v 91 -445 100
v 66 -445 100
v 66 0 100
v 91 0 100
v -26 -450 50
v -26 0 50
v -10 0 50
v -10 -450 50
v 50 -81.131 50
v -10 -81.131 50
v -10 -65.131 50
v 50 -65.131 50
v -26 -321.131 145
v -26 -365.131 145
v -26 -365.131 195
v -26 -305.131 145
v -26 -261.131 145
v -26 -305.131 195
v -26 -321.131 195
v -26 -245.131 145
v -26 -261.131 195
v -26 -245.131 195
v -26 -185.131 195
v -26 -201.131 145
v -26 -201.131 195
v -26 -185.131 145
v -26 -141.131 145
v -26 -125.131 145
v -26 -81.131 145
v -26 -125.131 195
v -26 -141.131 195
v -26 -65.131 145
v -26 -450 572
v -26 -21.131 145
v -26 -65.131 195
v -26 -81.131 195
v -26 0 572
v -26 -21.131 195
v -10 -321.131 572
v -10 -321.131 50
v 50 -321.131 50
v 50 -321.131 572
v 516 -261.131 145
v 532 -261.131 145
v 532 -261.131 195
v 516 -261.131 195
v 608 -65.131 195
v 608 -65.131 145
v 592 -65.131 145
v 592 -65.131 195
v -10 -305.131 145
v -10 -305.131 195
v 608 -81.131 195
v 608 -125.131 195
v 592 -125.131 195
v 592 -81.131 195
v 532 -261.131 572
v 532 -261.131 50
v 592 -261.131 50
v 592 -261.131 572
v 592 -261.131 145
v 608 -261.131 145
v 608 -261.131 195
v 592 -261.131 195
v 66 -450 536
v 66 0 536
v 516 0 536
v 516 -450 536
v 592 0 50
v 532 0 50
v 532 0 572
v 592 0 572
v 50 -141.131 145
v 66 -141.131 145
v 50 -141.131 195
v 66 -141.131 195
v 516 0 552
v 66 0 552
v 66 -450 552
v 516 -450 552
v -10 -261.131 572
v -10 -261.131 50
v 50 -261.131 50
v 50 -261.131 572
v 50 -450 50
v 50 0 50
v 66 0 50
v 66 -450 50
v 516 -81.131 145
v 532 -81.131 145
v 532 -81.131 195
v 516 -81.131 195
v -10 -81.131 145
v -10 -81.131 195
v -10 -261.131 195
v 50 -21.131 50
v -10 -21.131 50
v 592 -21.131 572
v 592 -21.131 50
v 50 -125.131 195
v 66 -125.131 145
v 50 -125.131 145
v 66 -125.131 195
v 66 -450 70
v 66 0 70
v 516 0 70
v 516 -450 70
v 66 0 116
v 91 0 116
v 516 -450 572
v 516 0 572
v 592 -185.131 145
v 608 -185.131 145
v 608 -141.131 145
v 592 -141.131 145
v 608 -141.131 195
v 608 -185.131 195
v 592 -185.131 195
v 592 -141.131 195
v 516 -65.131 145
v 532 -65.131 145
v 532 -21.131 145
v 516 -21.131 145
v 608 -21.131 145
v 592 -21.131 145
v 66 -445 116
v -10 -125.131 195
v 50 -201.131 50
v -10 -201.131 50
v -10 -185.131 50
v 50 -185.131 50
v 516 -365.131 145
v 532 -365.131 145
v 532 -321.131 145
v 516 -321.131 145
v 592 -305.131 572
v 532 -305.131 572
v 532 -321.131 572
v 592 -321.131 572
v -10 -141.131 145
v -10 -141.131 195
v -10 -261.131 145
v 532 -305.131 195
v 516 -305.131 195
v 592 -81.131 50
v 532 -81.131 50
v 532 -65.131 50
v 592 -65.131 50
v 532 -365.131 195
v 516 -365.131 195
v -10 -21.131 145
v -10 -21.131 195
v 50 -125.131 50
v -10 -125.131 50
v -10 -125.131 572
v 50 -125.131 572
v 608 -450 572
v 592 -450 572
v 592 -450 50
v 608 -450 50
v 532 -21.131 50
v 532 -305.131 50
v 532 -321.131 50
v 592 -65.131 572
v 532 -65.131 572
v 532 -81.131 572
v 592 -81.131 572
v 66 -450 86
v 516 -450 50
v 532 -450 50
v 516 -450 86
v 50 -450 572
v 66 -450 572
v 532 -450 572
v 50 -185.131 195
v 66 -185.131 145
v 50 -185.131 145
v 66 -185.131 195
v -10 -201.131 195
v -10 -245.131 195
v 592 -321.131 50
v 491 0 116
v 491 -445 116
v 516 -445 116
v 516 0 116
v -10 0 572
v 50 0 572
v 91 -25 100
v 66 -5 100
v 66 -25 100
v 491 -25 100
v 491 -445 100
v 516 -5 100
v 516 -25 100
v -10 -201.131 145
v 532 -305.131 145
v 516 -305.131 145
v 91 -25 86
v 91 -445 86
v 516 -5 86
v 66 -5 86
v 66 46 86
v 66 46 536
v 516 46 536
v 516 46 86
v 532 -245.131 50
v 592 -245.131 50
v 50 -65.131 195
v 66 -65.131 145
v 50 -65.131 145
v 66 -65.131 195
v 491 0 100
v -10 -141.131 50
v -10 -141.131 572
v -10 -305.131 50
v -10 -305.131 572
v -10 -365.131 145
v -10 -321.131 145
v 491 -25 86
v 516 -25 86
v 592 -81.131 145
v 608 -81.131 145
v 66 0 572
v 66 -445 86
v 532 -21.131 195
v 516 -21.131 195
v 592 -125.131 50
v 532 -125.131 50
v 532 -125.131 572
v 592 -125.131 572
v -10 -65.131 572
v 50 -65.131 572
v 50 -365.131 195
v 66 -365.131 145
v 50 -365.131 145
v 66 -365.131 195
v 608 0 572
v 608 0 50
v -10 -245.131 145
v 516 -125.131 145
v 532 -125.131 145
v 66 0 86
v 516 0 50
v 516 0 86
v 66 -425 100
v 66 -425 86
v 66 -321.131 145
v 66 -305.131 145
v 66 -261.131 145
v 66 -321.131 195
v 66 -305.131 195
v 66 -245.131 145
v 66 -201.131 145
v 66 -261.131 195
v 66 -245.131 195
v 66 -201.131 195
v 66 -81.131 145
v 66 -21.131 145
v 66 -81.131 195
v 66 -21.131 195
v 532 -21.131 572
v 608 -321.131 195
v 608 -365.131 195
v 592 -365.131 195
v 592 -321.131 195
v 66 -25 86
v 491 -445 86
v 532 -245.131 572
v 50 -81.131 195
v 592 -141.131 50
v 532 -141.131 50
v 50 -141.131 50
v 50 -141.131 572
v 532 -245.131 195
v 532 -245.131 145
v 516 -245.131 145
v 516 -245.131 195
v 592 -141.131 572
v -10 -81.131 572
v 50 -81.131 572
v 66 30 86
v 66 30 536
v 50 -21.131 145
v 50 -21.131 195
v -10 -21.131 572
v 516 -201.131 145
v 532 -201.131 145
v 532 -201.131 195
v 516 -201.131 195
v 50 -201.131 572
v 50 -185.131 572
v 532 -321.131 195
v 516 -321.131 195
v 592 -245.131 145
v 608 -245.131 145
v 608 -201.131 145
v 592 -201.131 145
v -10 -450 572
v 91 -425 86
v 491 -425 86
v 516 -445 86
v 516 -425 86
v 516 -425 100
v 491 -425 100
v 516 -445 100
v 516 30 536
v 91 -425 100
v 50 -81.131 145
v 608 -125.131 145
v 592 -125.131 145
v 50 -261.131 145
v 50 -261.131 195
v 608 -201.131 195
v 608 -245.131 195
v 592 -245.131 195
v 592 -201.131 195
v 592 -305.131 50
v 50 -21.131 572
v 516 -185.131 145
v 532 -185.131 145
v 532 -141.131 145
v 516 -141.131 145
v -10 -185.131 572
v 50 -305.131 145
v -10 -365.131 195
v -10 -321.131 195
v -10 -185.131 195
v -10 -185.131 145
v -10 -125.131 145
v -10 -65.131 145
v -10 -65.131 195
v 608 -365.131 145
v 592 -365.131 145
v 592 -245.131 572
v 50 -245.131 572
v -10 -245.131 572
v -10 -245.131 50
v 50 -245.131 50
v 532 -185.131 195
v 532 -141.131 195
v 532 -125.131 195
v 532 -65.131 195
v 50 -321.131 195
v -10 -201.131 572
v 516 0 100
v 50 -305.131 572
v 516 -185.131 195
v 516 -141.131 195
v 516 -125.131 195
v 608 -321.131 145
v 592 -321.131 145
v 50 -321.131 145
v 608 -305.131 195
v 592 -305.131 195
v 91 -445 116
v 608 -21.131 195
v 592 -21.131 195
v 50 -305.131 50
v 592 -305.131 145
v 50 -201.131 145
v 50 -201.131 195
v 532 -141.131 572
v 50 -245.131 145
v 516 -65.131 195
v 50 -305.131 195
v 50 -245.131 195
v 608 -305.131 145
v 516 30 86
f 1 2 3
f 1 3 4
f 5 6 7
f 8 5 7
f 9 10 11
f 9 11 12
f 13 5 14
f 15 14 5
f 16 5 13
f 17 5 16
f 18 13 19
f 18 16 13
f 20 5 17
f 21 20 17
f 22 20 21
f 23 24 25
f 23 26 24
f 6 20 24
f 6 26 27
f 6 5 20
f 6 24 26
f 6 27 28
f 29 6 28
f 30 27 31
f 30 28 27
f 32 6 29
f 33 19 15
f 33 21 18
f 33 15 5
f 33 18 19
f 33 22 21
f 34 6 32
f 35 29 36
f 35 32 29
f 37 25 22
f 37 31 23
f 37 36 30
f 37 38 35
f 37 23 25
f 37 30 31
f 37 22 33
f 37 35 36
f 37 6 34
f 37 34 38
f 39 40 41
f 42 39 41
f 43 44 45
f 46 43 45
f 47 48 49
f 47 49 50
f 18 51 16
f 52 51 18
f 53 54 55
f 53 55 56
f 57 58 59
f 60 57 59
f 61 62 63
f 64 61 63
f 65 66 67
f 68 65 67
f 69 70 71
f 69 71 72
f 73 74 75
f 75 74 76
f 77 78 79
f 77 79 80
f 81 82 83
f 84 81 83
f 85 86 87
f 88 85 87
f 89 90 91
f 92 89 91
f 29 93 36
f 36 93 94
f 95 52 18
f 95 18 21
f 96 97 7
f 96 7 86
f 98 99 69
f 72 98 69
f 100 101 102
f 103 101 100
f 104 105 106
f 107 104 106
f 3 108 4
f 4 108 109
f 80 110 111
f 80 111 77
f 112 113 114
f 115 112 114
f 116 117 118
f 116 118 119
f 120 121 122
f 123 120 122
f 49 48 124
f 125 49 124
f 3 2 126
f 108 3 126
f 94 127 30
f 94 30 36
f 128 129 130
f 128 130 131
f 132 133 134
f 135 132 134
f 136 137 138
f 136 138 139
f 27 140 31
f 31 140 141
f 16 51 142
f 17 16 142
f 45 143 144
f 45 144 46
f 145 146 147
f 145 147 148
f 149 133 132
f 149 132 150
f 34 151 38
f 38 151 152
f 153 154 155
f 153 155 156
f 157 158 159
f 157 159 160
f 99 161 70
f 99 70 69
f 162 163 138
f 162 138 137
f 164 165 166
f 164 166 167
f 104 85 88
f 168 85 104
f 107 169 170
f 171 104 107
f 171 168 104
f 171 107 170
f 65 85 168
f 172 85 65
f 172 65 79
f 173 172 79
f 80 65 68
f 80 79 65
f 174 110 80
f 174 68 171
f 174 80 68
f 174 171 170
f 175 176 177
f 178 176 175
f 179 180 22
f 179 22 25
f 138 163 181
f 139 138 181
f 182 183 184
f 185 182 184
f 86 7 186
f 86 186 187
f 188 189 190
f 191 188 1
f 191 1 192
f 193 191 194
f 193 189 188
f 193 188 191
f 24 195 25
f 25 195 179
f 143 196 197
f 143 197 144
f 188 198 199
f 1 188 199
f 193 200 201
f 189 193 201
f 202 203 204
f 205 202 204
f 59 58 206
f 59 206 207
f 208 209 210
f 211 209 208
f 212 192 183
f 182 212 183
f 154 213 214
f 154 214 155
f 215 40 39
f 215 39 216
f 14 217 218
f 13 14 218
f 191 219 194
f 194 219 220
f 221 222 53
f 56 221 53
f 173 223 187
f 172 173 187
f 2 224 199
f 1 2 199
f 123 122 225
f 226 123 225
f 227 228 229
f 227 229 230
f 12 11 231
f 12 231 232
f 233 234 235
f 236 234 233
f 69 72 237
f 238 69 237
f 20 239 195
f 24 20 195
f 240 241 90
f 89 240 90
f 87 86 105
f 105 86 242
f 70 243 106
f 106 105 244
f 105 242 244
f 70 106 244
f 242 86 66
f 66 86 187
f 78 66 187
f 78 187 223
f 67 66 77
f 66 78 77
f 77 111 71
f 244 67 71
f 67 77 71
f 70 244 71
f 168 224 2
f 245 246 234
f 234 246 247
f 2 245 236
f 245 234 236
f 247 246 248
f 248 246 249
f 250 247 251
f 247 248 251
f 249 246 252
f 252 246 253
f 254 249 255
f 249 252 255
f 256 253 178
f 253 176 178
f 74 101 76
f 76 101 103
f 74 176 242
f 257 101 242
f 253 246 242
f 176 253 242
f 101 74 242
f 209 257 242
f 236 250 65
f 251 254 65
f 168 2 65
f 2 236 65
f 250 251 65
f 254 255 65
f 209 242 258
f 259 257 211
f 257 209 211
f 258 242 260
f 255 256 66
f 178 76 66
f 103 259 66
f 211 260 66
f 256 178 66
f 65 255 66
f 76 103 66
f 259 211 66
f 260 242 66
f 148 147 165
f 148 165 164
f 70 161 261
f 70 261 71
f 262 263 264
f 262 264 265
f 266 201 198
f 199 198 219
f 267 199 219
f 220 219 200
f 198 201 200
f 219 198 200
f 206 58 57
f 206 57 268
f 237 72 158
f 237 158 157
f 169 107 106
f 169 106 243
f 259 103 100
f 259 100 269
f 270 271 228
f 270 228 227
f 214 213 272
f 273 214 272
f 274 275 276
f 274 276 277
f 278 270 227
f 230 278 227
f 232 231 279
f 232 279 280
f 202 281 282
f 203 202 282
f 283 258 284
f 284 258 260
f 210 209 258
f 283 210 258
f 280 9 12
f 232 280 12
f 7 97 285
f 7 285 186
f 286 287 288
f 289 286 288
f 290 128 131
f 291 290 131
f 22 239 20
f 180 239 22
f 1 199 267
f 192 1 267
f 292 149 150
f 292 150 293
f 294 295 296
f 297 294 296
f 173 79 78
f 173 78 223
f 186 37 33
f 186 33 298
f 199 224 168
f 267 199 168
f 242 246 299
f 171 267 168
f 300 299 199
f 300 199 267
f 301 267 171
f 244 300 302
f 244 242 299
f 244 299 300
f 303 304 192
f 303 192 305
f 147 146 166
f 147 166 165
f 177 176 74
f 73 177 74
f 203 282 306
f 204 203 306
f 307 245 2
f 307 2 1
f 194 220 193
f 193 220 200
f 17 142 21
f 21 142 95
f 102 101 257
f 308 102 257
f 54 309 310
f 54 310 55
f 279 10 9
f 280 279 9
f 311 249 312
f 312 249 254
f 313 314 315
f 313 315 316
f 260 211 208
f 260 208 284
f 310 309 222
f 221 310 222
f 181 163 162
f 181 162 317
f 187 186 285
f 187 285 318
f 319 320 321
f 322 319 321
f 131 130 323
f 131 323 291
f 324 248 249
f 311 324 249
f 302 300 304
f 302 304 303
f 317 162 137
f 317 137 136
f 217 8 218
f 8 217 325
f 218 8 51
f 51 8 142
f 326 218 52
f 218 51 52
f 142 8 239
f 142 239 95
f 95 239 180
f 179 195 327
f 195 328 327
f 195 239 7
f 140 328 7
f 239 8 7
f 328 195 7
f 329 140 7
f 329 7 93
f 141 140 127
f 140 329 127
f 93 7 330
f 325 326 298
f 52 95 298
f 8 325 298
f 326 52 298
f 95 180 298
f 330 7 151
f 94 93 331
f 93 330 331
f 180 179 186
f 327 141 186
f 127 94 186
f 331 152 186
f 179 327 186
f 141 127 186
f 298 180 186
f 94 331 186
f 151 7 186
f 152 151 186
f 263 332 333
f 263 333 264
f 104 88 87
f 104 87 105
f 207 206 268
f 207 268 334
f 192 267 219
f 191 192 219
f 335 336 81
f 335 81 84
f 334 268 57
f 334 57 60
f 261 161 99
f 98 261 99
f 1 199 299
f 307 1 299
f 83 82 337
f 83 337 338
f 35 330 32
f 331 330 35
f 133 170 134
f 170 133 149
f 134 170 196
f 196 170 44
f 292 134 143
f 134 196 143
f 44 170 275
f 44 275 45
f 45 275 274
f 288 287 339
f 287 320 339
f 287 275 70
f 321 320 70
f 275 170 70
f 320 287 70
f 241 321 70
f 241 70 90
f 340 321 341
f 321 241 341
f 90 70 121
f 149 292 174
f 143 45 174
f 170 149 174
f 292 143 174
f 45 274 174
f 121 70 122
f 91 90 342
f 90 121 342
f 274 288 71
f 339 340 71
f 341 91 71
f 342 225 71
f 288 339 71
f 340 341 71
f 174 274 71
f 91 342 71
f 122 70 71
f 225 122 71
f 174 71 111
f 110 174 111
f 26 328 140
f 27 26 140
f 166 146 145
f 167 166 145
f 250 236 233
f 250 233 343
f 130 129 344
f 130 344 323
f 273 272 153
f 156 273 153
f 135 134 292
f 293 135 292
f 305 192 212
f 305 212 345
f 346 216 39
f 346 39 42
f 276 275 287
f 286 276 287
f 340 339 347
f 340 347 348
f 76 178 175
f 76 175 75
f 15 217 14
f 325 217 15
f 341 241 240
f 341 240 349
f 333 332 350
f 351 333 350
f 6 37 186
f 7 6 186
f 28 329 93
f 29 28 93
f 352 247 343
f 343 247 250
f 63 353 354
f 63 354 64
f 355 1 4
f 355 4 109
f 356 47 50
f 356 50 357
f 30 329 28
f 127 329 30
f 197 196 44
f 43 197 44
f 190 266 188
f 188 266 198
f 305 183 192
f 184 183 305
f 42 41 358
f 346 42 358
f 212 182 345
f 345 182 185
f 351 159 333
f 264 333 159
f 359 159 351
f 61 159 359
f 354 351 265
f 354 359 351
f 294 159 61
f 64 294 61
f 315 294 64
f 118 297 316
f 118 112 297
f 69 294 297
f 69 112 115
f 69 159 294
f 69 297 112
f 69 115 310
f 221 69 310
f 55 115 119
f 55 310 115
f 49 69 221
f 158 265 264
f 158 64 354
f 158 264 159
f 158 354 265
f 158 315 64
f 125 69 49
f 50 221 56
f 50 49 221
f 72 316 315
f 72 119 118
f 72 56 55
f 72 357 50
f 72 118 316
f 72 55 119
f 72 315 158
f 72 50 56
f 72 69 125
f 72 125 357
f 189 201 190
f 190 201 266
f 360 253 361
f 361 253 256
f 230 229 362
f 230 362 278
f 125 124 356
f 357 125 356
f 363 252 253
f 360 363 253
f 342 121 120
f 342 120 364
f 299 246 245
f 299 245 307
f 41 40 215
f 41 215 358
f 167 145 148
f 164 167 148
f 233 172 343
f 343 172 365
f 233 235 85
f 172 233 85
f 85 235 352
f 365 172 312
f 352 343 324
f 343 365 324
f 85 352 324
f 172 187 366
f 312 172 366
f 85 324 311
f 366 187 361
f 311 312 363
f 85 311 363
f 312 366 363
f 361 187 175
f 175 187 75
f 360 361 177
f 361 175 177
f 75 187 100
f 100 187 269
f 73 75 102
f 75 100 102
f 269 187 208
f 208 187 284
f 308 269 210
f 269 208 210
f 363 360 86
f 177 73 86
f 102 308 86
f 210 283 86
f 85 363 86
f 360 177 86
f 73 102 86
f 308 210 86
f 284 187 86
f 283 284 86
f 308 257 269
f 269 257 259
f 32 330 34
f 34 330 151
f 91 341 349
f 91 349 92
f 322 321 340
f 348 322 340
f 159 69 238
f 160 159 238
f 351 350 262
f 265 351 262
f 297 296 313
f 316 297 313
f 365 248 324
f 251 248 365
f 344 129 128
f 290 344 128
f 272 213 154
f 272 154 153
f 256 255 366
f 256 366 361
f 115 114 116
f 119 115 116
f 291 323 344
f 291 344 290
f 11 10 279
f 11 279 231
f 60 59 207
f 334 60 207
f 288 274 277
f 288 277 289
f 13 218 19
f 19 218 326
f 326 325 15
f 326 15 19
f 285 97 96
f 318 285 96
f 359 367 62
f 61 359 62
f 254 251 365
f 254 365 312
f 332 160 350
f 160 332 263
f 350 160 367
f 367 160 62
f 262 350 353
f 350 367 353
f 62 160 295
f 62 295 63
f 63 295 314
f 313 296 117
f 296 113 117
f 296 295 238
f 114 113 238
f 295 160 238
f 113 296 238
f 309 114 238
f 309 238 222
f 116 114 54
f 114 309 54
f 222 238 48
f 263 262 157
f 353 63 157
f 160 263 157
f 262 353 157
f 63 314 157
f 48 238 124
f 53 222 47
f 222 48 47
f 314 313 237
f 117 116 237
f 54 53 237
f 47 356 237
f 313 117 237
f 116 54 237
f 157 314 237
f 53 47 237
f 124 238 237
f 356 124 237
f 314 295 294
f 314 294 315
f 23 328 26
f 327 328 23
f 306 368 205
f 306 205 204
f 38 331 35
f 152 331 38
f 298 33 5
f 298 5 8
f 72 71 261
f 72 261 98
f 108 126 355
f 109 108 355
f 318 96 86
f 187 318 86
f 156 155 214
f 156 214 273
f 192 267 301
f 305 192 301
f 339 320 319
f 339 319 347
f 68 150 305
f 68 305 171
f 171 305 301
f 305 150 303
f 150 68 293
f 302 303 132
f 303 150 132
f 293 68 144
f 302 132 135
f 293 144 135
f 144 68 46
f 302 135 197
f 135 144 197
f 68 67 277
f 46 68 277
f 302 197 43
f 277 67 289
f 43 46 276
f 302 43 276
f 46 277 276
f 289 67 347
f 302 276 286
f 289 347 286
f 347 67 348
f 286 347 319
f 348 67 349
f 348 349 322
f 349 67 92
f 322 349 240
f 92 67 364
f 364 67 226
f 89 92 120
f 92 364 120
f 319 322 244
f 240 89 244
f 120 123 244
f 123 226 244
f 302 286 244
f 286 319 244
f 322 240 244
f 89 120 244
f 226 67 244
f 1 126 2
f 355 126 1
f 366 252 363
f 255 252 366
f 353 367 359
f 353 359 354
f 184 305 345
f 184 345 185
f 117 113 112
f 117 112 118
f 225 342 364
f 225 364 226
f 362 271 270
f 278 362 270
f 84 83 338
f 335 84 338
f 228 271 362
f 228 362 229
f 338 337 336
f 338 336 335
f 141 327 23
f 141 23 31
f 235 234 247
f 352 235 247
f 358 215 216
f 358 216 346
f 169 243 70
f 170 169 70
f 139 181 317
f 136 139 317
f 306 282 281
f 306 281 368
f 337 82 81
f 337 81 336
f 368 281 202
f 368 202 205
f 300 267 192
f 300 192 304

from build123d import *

# Parameters (mm, degrees)
F1_W          = 450
F1_H          = 16
F3_DEPTH      = 450
F1_W_2        = 16
F1_H_2        = 522
F4_W          = 44
F4_H          = 50
F5_DEPTH      = 1209
F5_DEPTH_BACK = 175
F6_W          = 60
F6_H          = 21.131195128
F7_DEPTH      = 572
F6_H_2        = 16
F7_FACE_W     = 60
F7_FACE_H     = 21.131195128
F7_FACE_H_2   = 16
F8_DEPTH      = 50
F9_START      = -30
F1_H_3        = 450
F9_DEPTH      = 16
F11_START     = 86
F11_DEPTH     = 14
F12_START     = 70
F10_W         = 25
F10_H         = 20
F12_DEPTH     = 30
F13_W         = 25
F13_H         = 16
F14_DEPTH     = 445


with BuildPart() as f3:
    # F1 (on Front) → F3 (new body, through all)
    with BuildSketch(Plane.XZ):
        with Locations((291, 78)):
            Rectangle(F1_W, F1_H)
        Polygon((516, 86), (516, 70), (516, 50), (532, 50), (532, 572), (516, 572), (516, 552), (516, 536), align=None)
        with Locations((291, 544)):
            Rectangle(F1_W, F1_H)
        Polygon((50, 572), (50, 50), (66, 50), (66, 70), (66, 86), (66, 536), (66, 552), (66, 572), align=None)
    extrude(amount=F3_DEPTH)


with BuildPart() as f3b:
    # F1 (on Front) → F3, piece 2 (new body, through all)
    with BuildSketch(Plane.XZ):
        with Locations((600, 311)):
            Rectangle(F1_W_2, F1_H_2)
    extrude(amount=F3_DEPTH)


with BuildPart() as f3c:
    # F1 (on Front) → F3, piece 3 (new body, through all)
    with BuildSketch(Plane.XZ):
        with Locations((-18, 311)):
            Rectangle(F1_W_2, F1_H_2)
    extrude(amount=F3_DEPTH)


with BuildPart() as f5_tool:
    # F4 (on Right) → F5 (new body, two sides)
    with BuildSketch(Plane.YZ) as f5_sk:
        with Locations((-43.131195128, 170)):
            Rectangle(F4_W, F4_H)
        with Locations((-103.131195128, 170)):
            Rectangle(F4_W, F4_H)
        with Locations((-163.131195128, 170)):
            Rectangle(F4_W, F4_H)
        with Locations((-223.131195128, 170)):
            Rectangle(F4_W, F4_H)
        with Locations((-283.131195128, 170)):
            Rectangle(F4_W, F4_H)
        with Locations((-343.131195128, 170)):
            Rectangle(F4_W, F4_H)
    extrude(amount=F5_DEPTH)
    extrude(f5_sk.sketch, amount=-F5_DEPTH_BACK)


with BuildPart() as f3_1:
    add(f3.part)

    # F5: cut by f5_tool
    add(f5_tool.part, mode=Mode.SUBTRACT)

    # F10 (on Top) → F12 (join)
    with BuildSketch(Plane.XY.offset(F12_START)):
        with Locations((78.5, -435)):
            Rectangle(F10_W, F10_H)
        with Locations((503.5, -435)):
            Rectangle(F10_W, F10_H)
    extrude(amount=F12_DEPTH)


with BuildPart() as f3b_1:
    add(f3b.part)

    # F5: cut by f5_tool
    add(f5_tool.part, mode=Mode.SUBTRACT)


with BuildPart() as f3c_1:
    add(f3c.part)

    # F5: cut by f5_tool
    add(f5_tool.part, mode=Mode.SUBTRACT)


with BuildPart() as f7:
    # F6 (on Top) → F7 (new body, through all)
    with BuildSketch(Plane.XY):
        with Locations((20, -10.565597564)):
            Rectangle(F6_W, F6_H)
    extrude(amount=F7_DEPTH)


with BuildPart() as f7b:
    # F6 (on Top) → F7, piece 2 (new body, through all)
    with BuildSketch(Plane.XY):
        with Locations((20, -73.131195128)):
            Rectangle(F6_W, F6_H_2)
    extrude(amount=F7_DEPTH)


with BuildPart() as f7c:
    # F6 (on Top) → F7, piece 3 (new body, through all)
    with BuildSketch(Plane.XY):
        with Locations((20, -133.131195128)):
            Rectangle(F6_W, F6_H_2)
    extrude(amount=F7_DEPTH)


with BuildPart() as f7d:
    # F6 (on Top) → F7, piece 4 (new body, through all)
    with BuildSketch(Plane.XY):
        with Locations((20, -193.131195128)):
            Rectangle(F6_W, F6_H_2)
    extrude(amount=F7_DEPTH)


with BuildPart() as f7e:
    # F6 (on Top) → F7, piece 5 (new body, through all)
    with BuildSketch(Plane.XY):
        with Locations((20, -253.131195128)):
            Rectangle(F6_W, F6_H_2)
    extrude(amount=F7_DEPTH)


with BuildPart() as f7f:
    # F6 (on Top) → F7, piece 6 (new body, through all)
    with BuildSketch(Plane.XY):
        with Locations((20, -313.131195128)):
            Rectangle(F6_W, F6_H_2)
    extrude(amount=F7_DEPTH)


with BuildPart() as f7g:
    # F6 (on Top) → F7, piece 7 (new body, through all)
    with BuildSketch(Plane.XY):
        with Locations((562, -313.131195128)):
            Rectangle(F6_W, F6_H_2)
    extrude(amount=F7_DEPTH)


with BuildPart() as f7h:
    # F6 (on Top) → F7, piece 8 (new body, through all)
    with BuildSketch(Plane.XY):
        with Locations((562, -253.131195128)):
            Rectangle(F6_W, F6_H_2)
    extrude(amount=F7_DEPTH)


with BuildPart() as f7i:
    # F6 (on Top) → F7, piece 9 (new body, through all)
    with BuildSketch(Plane.XY):
        with Locations((562, -133.131195128)):
            Rectangle(F6_W, F6_H_2)
    extrude(amount=F7_DEPTH)


with BuildPart() as f7j:
    # F6 (on Top) → F7, piece 10 (new body, through all)
    with BuildSketch(Plane.XY):
        with Locations((562, -73.131195128)):
            Rectangle(F6_W, F6_H_2)
    extrude(amount=F7_DEPTH)


with BuildPart() as f7k:
    # F6 (on Top) → F7, piece 11 (new body, through all)
    with BuildSketch(Plane.XY):
        with Locations((562, -10.565597564)):
            Rectangle(F6_W, F6_H)
    extrude(amount=F7_DEPTH)


with BuildPart() as f8_tool:
    # F7_face (on face) → F8 (new body, through all)
    with BuildSketch(Plane(origin=(20, -10.565597564, 0), x_dir=(1, 0, 0), z_dir=(0, 0, -1))):
        Rectangle(F7_FACE_W, F7_FACE_H)
        with Locations((0, 62.565597564)):
            Rectangle(F7_FACE_W, F7_FACE_H_2)
        with Locations((0, 122.565597564)):
            Rectangle(F7_FACE_W, F7_FACE_H_2)
        with Locations((0, 182.565597564)):
            Rectangle(F7_FACE_W, F7_FACE_H_2)
        with Locations((0, 242.565597564)):
            Rectangle(F7_FACE_W, F7_FACE_H_2)
        with Locations((0, 302.565597564)):
            Rectangle(F7_FACE_W, F7_FACE_H_2)
        with Locations((542, 0)):
            Rectangle(F7_FACE_W, F7_FACE_H)
        with Locations((542, 62.565597564)):
            Rectangle(F7_FACE_W, F7_FACE_H_2)
        with Locations((542, 122.565597564)):
            Rectangle(F7_FACE_W, F7_FACE_H_2)
        with Locations((542, 242.565597564)):
            Rectangle(F7_FACE_W, F7_FACE_H_2)
        with Locations((542, 302.565597564)):
            Rectangle(F7_FACE_W, F7_FACE_H_2)
    extrude(amount=-F8_DEPTH)


with BuildPart() as f7_1:
    add(f7.part)

    # F8: cut by f8_tool
    add(f8_tool.part, mode=Mode.SUBTRACT)


with BuildPart() as f7b_1:
    add(f7b.part)

    # F8: cut by f8_tool
    add(f8_tool.part, mode=Mode.SUBTRACT)


with BuildPart() as f7c_1:
    add(f7c.part)

    # F8: cut by f8_tool
    add(f8_tool.part, mode=Mode.SUBTRACT)


with BuildPart() as f7d_1:
    add(f7d.part)

    # F8: cut by f8_tool
    add(f8_tool.part, mode=Mode.SUBTRACT)


with BuildPart() as f7e_1:
    add(f7e.part)

    # F8: cut by f8_tool
    add(f8_tool.part, mode=Mode.SUBTRACT)


with BuildPart() as f7f_1:
    add(f7f.part)

    # F8: cut by f8_tool
    add(f8_tool.part, mode=Mode.SUBTRACT)


with BuildPart() as f7g_1:
    add(f7g.part)

    # F8: cut by f8_tool
    add(f8_tool.part, mode=Mode.SUBTRACT)


with BuildPart() as f7h_1:
    add(f7h.part)

    # F8: cut by f8_tool
    add(f8_tool.part, mode=Mode.SUBTRACT)


with BuildPart() as f7i_1:
    add(f7i.part)

    # F8: cut by f8_tool
    add(f8_tool.part, mode=Mode.SUBTRACT)


with BuildPart() as f7j_1:
    add(f7j.part)

    # F8: cut by f8_tool
    add(f8_tool.part, mode=Mode.SUBTRACT)


with BuildPart() as f7k_1:
    add(f7k.part)

    # F8: cut by f8_tool
    add(f8_tool.part, mode=Mode.SUBTRACT)


with BuildPart() as f9:
    # F1 (on Front) → F9 (new body)
    with BuildSketch(Plane.XZ.offset(F9_START)):
        with Locations((291, 311)):
            Rectangle(F1_W, F1_H_3)
    extrude(amount=-F9_DEPTH)


with BuildPart() as f11:
    # F10 (on Top) → F11 (new body)
    with BuildSketch(Plane.XY.offset(F11_START)):
        Polygon((491, -25), (91, -25), (91, -425), (91, -445), (491, -445), (491, -425), align=None)
        Polygon((66, -5), (66, -25), (91, -25), (491, -25), (516, -25), (516, -5), align=None)
    extrude(amount=F11_DEPTH)


with BuildPart() as f14:
    # F13 (on face) → F14 (new body, through all)
    with BuildSketch(Plane.XZ.offset(445)):
        with Locations((78.5, 108)):
            Rectangle(F13_W, F13_H)
    extrude(amount=-F14_DEPTH)


with BuildPart() as f14b:
    # F13 (on face) → F14, piece 2 (new body, through all)
    with BuildSketch(Plane.XZ.offset(445)):
        with Locations((503.5, 108)):
            Rectangle(F13_W, F13_H)
    extrude(amount=-F14_DEPTH)


solid = Compound([f3_1.part, f3b_1.part, f3c_1.part, f7_1.part, f7b_1.part, f7c_1.part, f7d_1.part, f7e_1.part, f7f_1.part, f7g_1.part, f7h_1.part, f7i_1.part, f7j_1.part, f7k_1.part, f9.part, f11.part, f14.part, f14b.part])
